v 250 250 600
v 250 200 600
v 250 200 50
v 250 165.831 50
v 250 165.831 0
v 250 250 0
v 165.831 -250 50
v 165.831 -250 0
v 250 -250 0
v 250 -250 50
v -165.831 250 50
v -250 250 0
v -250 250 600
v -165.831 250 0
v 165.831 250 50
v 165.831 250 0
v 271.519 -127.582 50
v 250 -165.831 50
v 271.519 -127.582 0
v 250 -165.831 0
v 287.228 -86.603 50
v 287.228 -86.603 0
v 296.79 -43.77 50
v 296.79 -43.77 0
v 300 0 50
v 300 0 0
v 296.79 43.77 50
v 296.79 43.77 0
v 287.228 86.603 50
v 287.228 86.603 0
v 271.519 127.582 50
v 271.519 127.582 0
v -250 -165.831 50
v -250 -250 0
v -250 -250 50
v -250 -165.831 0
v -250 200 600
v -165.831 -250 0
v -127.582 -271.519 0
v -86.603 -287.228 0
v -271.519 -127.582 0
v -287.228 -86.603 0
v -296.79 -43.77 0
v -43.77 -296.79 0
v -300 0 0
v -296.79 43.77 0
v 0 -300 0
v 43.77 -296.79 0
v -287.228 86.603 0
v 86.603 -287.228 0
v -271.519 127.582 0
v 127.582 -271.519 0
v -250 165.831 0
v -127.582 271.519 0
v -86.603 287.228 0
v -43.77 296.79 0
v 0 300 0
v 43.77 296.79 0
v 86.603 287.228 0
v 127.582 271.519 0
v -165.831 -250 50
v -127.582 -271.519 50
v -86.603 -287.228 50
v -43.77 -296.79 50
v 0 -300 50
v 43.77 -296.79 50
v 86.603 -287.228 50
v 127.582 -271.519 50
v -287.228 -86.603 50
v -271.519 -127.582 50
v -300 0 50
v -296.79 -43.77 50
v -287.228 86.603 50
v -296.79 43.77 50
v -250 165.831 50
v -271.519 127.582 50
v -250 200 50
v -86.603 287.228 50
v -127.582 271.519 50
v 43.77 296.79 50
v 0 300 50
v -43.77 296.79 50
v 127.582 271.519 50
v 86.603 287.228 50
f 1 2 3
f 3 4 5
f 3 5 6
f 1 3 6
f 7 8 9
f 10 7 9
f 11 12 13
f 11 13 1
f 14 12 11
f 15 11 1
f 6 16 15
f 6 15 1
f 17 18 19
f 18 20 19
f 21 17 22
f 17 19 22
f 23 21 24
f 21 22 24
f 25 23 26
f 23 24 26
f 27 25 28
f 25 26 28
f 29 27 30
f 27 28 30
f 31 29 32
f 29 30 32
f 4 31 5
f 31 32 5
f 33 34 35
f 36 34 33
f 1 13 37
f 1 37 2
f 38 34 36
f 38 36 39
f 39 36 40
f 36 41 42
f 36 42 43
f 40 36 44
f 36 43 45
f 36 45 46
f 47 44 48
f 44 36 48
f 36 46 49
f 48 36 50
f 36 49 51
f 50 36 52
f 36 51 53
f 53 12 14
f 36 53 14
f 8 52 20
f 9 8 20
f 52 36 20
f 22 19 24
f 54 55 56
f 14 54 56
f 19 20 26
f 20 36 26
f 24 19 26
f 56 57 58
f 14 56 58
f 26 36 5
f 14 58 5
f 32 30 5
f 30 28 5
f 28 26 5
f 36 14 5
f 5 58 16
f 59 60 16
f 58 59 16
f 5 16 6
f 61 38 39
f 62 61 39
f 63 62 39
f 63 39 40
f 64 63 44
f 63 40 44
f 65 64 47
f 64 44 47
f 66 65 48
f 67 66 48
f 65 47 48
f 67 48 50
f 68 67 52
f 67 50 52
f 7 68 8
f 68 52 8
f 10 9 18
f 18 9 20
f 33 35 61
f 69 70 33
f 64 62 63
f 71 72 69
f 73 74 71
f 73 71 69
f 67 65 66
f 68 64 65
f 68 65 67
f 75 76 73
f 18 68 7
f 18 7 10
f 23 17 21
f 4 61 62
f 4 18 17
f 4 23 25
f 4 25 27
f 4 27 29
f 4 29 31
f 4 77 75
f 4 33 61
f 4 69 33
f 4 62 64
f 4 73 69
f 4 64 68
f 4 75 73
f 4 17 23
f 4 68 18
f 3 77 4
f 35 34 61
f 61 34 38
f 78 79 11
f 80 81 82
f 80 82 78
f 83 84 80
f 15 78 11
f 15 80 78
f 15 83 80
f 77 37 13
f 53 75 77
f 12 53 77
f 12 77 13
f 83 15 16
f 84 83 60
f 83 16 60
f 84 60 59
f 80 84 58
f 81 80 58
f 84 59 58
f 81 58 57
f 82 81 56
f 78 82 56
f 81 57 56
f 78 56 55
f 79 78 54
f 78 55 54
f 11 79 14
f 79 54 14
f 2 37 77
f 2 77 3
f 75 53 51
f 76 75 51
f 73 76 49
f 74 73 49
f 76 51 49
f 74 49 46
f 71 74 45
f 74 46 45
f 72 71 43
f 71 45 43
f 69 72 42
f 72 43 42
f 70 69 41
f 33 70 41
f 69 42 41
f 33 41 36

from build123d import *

# Parameters (mm, degrees)
SKETCH_1_R      = 300
EXTRUDE_1_DEPTH = 50
SKETCH_2_W      = 500
SKETCH_2_H      = 500
EXTRUDE_2_DEPTH = 50
SKETCH_3_W      = 500
SKETCH_3_H      = 50
EXTRUDE_3_DEPTH = 600


with BuildPart() as part:
    # 草图1 → 凸台-拉伸1 (new body)
    with BuildSketch(Plane.XY):
        Circle(SKETCH_1_R)
    extrude(amount=EXTRUDE_1_DEPTH)

    # 草图2 → 凸台-拉伸2 (add)
    with BuildSketch(Plane.XY):
        Rectangle(SKETCH_2_W, SKETCH_2_H)
    extrude(amount=EXTRUDE_2_DEPTH)

    # 草图3 → 凸台-拉伸3 (add)
    with BuildSketch(Plane.XY):
        with Locations((0, 225)):
            Rectangle(SKETCH_3_W, SKETCH_3_H)
    extrude(amount=EXTRUDE_3_DEPTH)


solid = part.part
